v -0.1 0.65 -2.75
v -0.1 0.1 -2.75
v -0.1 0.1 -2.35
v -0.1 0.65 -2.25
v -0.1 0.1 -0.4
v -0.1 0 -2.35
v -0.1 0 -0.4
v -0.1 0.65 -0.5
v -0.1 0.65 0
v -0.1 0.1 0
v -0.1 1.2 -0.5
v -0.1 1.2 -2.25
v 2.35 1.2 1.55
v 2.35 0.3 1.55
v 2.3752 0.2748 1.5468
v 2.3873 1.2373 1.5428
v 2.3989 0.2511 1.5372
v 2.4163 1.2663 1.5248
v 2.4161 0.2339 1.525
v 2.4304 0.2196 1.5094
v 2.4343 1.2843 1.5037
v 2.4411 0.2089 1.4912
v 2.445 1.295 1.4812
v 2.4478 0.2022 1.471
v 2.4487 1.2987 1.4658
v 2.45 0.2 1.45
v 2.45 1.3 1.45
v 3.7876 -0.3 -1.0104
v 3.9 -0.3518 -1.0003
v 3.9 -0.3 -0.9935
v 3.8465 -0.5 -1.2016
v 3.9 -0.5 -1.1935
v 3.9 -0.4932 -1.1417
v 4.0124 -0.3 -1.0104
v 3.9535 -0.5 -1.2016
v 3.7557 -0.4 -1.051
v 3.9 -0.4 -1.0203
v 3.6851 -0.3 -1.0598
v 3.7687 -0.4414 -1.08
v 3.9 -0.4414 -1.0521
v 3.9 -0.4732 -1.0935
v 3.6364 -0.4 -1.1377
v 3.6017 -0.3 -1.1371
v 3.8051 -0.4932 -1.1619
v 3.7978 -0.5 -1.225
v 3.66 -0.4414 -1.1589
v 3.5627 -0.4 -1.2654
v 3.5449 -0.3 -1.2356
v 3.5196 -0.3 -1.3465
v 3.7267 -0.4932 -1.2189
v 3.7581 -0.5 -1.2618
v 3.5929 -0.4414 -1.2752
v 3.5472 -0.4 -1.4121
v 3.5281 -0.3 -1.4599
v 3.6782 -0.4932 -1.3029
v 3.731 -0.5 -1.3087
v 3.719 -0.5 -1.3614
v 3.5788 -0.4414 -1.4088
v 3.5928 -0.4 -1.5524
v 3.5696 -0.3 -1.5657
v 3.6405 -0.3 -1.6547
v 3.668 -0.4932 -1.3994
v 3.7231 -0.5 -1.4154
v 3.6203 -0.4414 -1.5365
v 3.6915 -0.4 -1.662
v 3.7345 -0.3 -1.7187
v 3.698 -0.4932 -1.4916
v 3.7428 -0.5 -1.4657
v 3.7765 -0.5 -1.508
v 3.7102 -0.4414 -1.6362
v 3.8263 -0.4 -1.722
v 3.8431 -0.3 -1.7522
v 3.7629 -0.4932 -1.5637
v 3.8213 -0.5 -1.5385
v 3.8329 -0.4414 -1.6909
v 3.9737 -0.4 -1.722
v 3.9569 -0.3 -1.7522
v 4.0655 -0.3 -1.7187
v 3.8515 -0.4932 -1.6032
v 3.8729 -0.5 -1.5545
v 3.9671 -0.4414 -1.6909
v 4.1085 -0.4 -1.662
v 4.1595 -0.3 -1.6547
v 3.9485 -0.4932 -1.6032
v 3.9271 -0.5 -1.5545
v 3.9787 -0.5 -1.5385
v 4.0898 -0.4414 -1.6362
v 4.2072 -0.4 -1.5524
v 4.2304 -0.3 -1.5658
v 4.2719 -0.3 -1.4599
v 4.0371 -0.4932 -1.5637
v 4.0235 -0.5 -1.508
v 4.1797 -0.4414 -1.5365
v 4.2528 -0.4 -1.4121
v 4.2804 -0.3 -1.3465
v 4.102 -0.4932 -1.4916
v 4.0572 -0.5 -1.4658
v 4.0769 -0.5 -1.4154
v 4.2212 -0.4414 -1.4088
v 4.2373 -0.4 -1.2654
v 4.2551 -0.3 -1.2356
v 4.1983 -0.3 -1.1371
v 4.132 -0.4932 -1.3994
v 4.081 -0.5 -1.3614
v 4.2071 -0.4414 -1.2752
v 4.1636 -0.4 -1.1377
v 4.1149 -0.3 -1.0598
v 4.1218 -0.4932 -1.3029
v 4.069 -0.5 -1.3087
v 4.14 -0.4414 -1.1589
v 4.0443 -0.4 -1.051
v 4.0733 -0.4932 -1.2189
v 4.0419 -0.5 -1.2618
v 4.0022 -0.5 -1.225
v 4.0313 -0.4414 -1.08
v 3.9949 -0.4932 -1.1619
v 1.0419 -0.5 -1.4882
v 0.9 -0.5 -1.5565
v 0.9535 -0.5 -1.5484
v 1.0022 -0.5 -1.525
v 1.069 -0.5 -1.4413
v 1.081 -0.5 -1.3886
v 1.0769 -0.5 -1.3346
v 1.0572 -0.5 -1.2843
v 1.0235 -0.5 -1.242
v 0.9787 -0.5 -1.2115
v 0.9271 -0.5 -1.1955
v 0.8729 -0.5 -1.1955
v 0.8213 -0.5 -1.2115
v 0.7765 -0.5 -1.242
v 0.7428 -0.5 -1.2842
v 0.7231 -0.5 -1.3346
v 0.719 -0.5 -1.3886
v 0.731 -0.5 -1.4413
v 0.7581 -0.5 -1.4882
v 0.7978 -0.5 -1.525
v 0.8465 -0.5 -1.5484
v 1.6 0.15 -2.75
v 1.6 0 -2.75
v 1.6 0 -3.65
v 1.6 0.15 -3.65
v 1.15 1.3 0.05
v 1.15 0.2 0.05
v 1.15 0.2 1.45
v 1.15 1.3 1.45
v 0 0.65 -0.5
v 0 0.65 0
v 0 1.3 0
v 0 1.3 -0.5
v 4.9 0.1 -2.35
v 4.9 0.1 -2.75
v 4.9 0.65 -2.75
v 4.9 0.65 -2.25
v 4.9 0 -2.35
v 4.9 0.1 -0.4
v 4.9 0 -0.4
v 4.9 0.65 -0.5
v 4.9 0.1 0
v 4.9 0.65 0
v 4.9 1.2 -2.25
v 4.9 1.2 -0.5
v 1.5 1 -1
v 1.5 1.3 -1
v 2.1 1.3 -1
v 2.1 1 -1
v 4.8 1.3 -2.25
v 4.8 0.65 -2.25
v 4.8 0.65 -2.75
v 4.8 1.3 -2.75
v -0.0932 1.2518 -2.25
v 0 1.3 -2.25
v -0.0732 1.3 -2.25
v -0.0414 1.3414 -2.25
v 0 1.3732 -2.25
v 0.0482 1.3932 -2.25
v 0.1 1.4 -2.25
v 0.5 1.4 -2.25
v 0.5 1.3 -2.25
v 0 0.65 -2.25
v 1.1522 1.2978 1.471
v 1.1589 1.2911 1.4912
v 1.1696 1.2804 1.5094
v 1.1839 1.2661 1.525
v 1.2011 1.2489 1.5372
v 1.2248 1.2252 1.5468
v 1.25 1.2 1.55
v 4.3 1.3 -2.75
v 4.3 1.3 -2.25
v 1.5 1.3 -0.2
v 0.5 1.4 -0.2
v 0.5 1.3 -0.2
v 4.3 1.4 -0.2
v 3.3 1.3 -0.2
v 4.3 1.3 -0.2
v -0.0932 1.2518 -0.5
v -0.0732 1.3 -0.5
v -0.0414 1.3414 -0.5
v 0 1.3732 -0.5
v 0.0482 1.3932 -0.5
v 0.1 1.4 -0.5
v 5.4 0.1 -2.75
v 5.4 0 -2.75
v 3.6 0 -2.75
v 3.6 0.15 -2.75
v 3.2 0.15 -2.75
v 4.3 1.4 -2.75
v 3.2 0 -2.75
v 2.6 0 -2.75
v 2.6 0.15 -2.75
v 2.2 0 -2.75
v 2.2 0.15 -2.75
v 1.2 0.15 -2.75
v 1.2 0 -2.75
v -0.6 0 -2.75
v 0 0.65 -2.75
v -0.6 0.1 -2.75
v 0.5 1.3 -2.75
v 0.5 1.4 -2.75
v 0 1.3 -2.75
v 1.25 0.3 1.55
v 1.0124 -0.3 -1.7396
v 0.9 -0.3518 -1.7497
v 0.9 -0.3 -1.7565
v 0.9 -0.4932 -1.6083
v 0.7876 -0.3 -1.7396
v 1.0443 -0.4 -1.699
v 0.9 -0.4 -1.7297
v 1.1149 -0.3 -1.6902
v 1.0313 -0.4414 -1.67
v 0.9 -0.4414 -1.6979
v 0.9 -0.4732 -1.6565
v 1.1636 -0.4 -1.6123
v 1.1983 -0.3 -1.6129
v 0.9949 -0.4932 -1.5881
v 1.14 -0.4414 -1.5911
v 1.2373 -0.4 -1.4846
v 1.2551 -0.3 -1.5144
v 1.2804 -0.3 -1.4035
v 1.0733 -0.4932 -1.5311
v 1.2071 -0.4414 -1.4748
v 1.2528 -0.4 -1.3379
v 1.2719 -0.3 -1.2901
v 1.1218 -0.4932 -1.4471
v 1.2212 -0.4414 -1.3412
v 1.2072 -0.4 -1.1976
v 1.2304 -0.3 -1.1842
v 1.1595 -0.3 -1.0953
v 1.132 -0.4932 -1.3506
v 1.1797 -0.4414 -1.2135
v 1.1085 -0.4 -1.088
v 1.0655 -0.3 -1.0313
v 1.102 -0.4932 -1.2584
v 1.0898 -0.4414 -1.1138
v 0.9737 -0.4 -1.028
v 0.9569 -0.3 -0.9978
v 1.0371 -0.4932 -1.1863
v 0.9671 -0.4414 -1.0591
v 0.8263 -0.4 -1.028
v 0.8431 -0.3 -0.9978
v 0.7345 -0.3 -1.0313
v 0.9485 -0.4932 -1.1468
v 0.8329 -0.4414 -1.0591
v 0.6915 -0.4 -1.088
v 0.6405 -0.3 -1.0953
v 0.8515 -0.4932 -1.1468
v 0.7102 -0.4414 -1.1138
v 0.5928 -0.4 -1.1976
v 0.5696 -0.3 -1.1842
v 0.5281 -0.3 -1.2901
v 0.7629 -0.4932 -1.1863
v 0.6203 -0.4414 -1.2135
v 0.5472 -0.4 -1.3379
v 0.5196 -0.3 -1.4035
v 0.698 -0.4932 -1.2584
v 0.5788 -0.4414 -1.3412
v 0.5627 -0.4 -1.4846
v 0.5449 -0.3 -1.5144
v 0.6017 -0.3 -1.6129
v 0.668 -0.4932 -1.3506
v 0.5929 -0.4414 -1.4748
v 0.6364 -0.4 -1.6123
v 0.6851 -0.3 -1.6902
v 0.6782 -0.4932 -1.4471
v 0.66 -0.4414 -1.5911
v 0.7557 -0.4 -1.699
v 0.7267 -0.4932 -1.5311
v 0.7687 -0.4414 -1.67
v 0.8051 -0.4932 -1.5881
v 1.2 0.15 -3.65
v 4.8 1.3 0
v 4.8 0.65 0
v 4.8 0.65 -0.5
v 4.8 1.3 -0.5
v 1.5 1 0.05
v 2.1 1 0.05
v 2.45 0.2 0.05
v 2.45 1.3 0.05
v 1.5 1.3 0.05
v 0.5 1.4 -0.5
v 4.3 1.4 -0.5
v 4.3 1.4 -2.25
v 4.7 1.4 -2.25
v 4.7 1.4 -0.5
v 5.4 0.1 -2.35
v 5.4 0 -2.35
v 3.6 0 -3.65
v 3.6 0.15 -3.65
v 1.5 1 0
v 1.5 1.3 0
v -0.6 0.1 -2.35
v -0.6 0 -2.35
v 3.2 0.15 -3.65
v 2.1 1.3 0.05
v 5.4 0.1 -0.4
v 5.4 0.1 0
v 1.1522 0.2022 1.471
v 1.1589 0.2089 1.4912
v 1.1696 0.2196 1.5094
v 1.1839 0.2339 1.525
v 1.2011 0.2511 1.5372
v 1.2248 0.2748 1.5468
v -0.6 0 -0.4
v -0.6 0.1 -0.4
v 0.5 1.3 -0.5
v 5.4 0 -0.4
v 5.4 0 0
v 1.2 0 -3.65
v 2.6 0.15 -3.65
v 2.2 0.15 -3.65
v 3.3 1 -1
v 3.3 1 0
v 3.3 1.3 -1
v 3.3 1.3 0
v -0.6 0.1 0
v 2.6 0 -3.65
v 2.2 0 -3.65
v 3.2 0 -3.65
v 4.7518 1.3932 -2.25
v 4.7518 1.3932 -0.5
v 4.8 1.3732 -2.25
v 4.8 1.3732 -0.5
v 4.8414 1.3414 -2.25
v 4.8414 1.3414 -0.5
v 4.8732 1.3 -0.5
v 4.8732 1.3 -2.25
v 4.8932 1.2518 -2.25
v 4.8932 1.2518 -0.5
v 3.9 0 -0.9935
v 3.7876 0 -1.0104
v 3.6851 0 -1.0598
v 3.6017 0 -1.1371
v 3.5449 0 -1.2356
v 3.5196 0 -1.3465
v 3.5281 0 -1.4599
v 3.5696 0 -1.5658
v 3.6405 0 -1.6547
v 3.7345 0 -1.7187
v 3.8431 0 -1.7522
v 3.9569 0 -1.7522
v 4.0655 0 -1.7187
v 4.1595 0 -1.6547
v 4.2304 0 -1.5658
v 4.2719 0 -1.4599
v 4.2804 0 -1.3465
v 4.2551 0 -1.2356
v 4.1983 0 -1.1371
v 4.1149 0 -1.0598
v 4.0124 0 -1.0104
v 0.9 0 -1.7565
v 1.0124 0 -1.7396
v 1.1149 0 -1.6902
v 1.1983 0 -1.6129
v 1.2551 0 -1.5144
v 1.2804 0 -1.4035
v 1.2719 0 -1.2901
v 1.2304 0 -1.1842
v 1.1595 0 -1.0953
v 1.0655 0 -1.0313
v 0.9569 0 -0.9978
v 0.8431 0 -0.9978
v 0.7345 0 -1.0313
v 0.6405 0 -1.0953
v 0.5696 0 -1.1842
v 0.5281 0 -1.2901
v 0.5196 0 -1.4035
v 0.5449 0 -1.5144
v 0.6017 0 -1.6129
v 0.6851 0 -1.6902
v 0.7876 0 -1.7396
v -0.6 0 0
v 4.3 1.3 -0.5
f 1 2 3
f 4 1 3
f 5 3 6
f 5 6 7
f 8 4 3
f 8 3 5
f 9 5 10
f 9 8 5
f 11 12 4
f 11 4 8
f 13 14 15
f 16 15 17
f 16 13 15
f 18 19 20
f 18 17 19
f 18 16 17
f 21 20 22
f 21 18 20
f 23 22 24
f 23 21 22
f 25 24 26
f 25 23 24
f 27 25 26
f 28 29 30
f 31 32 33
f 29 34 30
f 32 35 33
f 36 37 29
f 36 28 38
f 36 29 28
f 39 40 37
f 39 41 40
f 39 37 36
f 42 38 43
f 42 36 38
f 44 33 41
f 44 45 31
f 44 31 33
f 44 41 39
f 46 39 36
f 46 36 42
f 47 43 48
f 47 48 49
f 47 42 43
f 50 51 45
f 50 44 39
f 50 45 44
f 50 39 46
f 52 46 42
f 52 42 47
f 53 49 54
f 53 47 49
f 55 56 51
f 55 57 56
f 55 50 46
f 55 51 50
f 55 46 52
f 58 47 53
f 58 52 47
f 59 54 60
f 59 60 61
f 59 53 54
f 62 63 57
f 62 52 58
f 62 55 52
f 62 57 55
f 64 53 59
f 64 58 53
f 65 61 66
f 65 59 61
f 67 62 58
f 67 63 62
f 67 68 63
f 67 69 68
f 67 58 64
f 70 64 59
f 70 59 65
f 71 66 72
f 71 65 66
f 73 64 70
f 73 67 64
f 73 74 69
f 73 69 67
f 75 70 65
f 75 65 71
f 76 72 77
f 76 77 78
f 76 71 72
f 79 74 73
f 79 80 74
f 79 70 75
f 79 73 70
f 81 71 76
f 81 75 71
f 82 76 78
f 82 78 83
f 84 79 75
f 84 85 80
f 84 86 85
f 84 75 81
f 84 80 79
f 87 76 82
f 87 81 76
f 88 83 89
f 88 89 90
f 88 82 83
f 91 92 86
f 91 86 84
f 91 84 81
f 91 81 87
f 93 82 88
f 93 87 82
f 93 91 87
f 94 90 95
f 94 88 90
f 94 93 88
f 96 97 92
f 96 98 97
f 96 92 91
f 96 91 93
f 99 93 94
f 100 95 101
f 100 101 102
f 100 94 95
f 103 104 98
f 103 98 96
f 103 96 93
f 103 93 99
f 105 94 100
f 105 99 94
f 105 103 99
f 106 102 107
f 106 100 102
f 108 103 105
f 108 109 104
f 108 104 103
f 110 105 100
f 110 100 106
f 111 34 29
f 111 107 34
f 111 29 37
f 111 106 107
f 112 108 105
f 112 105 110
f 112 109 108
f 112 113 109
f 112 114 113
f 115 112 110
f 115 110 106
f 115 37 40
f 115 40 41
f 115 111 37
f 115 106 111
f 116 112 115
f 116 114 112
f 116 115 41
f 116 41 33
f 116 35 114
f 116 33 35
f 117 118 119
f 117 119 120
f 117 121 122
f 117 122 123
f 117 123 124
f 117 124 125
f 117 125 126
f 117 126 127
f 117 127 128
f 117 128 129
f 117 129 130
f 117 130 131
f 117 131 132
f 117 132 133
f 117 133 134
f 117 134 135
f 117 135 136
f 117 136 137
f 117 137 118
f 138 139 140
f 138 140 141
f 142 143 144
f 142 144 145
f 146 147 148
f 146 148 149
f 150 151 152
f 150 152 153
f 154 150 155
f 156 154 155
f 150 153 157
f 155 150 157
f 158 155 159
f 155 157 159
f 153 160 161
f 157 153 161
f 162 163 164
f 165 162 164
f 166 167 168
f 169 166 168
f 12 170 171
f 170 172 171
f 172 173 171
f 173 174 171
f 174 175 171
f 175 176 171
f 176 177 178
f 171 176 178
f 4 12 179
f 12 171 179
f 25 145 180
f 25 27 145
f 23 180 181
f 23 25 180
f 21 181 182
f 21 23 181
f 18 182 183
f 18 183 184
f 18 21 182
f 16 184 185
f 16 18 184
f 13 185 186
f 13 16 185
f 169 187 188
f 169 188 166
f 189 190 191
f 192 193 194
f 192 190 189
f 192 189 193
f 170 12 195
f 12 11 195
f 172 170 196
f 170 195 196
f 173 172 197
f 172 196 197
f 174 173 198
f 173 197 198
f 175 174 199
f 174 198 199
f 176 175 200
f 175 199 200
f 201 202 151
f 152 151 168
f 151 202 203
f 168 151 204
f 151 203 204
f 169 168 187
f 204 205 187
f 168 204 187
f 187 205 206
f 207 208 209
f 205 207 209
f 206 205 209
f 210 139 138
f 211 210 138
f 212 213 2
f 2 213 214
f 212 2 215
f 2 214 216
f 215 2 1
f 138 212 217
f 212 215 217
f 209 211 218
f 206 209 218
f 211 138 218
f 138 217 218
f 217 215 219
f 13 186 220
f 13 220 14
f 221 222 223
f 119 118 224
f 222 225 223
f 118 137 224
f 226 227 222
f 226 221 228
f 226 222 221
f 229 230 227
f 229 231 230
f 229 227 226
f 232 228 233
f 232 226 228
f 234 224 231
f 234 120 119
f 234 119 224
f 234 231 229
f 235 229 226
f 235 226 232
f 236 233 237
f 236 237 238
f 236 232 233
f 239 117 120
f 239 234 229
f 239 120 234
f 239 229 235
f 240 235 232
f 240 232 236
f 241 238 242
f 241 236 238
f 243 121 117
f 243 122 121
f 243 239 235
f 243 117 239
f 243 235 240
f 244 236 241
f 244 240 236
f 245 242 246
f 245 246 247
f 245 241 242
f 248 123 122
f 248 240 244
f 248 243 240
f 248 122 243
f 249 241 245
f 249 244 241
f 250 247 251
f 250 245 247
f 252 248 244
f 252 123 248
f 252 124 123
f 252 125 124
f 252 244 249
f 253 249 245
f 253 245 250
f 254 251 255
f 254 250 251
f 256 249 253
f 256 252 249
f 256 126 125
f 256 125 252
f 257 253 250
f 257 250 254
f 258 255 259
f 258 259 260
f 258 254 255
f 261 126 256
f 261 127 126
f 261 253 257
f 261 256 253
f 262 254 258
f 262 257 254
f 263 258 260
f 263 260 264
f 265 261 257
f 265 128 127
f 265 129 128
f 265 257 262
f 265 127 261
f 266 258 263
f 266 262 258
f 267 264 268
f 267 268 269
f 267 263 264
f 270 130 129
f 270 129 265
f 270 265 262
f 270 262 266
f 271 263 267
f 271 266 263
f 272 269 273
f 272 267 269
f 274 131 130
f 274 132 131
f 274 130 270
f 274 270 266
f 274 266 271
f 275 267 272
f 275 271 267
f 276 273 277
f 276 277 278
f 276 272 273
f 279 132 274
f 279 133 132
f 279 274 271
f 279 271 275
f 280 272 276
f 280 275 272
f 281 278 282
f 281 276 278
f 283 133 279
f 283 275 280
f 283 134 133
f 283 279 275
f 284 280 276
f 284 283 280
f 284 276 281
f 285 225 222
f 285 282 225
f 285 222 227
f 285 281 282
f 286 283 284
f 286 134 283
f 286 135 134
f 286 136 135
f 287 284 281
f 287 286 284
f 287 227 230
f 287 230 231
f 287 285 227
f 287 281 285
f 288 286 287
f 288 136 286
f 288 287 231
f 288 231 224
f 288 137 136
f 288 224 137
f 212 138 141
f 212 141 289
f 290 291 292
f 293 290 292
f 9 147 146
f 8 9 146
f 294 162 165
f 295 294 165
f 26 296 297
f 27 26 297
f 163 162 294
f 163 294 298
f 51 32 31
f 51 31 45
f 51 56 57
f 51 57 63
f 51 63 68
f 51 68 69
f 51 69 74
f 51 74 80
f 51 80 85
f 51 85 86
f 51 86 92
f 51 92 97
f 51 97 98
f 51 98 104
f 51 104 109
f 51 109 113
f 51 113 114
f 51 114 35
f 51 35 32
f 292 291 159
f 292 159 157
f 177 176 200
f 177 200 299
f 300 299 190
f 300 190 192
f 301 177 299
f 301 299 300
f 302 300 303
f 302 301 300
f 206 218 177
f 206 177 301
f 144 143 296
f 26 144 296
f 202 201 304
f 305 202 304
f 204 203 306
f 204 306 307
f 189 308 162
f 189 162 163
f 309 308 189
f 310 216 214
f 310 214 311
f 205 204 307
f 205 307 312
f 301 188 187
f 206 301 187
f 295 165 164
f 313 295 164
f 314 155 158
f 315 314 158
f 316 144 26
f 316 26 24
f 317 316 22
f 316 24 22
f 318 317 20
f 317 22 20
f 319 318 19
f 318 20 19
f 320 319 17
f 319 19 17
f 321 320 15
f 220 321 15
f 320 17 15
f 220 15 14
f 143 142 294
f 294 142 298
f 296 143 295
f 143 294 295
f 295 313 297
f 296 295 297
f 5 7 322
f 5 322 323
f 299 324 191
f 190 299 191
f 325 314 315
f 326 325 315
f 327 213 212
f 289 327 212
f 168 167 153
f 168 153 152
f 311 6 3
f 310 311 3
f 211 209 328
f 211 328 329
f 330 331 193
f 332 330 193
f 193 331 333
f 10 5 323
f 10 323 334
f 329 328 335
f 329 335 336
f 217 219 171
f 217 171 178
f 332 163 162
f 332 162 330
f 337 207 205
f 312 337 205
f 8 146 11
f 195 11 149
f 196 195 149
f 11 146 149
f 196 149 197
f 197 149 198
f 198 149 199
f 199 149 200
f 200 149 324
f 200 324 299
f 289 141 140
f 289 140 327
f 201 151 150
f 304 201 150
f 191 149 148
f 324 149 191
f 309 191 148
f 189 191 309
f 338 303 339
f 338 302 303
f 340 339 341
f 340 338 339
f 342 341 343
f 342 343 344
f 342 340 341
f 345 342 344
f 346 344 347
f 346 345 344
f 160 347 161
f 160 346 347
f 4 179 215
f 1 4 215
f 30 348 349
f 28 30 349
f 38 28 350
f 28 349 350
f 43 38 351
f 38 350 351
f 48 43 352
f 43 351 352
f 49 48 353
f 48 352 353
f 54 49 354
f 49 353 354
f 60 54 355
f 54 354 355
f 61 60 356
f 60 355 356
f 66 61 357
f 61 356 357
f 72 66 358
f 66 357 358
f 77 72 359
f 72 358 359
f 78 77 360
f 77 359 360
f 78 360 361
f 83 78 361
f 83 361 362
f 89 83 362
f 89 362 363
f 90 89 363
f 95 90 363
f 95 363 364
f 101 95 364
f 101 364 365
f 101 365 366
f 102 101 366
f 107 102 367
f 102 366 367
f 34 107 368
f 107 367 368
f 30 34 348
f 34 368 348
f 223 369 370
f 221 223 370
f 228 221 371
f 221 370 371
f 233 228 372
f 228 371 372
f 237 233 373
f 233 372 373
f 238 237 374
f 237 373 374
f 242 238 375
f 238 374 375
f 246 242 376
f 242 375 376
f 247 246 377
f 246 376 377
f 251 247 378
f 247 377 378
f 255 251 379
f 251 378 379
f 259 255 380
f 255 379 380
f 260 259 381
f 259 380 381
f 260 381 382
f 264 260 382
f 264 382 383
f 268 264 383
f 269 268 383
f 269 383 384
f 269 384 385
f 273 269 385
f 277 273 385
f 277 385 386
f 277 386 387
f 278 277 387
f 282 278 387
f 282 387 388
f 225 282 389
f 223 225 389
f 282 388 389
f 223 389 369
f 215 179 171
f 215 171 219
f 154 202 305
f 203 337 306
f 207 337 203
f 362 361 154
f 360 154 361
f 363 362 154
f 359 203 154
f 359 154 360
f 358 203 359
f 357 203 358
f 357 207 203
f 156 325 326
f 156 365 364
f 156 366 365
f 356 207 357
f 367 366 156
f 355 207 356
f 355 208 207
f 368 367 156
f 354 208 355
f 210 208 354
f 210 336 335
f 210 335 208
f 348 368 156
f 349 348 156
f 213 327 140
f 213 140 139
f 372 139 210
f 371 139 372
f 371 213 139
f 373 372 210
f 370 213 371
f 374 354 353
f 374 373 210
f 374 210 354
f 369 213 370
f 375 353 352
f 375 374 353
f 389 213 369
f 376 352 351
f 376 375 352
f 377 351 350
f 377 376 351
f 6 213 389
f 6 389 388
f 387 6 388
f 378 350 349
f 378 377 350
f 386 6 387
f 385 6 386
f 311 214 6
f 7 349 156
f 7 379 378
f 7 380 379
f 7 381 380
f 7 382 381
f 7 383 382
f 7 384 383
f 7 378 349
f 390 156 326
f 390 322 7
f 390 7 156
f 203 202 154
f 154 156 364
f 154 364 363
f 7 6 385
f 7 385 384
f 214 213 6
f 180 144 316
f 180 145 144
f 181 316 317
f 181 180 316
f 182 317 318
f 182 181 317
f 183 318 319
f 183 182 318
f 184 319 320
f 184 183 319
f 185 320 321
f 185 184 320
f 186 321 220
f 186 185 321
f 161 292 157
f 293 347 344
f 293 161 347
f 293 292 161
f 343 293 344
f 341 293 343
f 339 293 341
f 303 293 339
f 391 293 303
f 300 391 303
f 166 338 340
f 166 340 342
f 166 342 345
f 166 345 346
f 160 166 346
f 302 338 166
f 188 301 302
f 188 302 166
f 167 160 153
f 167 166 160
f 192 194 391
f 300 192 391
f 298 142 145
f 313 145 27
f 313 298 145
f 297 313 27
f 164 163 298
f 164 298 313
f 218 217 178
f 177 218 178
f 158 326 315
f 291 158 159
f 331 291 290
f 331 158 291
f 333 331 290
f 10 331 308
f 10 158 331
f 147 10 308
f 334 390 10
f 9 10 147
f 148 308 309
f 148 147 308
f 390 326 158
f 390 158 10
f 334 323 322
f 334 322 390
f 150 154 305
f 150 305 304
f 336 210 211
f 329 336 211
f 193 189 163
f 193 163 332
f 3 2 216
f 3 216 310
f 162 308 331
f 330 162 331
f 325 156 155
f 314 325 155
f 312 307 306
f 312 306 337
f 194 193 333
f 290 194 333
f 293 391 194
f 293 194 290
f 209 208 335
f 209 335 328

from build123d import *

# Parameters (mm, degrees)
SKETCH_1_W          = 4.8
SKETCH_1_H          = 2.75
EXTRUDE_1_DEPTH     = 1.3
SKETCH_2_W          = 0.1
SKETCH_2_H          = 1.75
EXTRUDE_3_DEPTH     = 0.1
EXTRUDE_4_DEPTH     = 0.1
SKETCH_4_W          = 0.4
SKETCH_4_H          = 0.1
EXTRUDE_5_DEPTH     = 0.5
SKETCH_5_W          = 3.8
SKETCH_5_H          = 0.2
CUT_EXTRUDE_1_DEPTH = 0.1
SKETCH_6_W          = 1.8
SKETCH_6_H          = 0.3
CUT_EXTRUDE_2_DEPTH = 1
SKETCH_7_W          = 0.6
SKETCH_7_H          = 0.3
EXTRUDE_6_DEPTH     = 1.05
SKETCH_8_W          = 1.3
SKETCH_8_H          = 1.1
EXTRUDE_7_DEPTH     = 1.5
SKETCH_9_W          = 0.4
SKETCH_9_H          = 0.15
EXTRUDE_8_DEPTH     = 0.9
FILLET_1_R          = 0.2
FILLET_2_R          = 0.1
SKETCH_10_R         = 0.3815
EXTRUDE_9_DEPTH     = 0.5
FILLET_3_R          = 0.2


with BuildPart() as part:
    # 草图1 → 凸台-拉伸1 (new body)
    with BuildSketch(Plane(origin=(0, 0, 0), x_dir=(1, 0, 0), z_dir=(0, 1, 0))):
        with Locations((2.4, 1.375)):
            Rectangle(SKETCH_1_W, SKETCH_1_H)
    extrude(amount=EXTRUDE_1_DEPTH)



with BuildPart() as body_2:
    # 草图2 → 凸台-拉伸3 (new body)
    with BuildSketch(Plane(origin=(0, 1.3, 0), x_dir=(1, 0, 0), z_dir=(0, 1, 0))):
        Polygon((0.5, 2.25), (0, 2.25), (0, 1.375), (0, 0.5), (0.5, 0.5), (0.5, 0), (4.3, 0), (4.3, 0.5), (4.8, 0.5), (4.8, 2.25), (4.3, 2.25), (4.3, 2.75), (0.5, 2.75), align=None)
        Polygon((0, 1.375), (0, 2.25), (-0.1, 2.25), (-0.1, 0.5), (0, 0.5), align=None)
        with Locations((4.85, 1.375)):
            Rectangle(SKETCH_2_W, SKETCH_2_H)
    extrude(amount=EXTRUDE_3_DEPTH)


with BuildPart() as part_1:
    add(part.part)

    add(body_2.part)  # 凸台-拉伸4 merges body 2
    # 草图3 → 凸台-拉伸4 (add)
    with BuildSketch(Plane.ZY):
        Polygon((-2.75, 0), (0, 0), (0, 0.65), (-0.5, 0.65), (-0.5, 1.3), (-2.25, 1.3), (-2.25, 0.65), (-2.75, 0.65), align=None)
    extrude(amount=EXTRUDE_4_DEPTH)


with BuildPart() as body_2_2:
    # 镜向16: mirrored copy
    add(part_1.part.mirror(Plane(origin=(2.4, 0, 0), x_dir=(0, 0, 1), z_dir=(1, 0, 0))))


with BuildPart() as part_2:
    add(part_1.part)

    add(body_2_2.part)  # 凸台-拉伸5 merges body 2 2
    # 草图4 → 凸台-拉伸5 (add)
    with BuildSketch(Plane.ZY.offset(0.1)):
        with Locations((-2.55, 0.05)):
            Rectangle(SKETCH_4_W, SKETCH_4_H)
        with Locations((-0.2, 0.05)):
            Rectangle(SKETCH_4_W, SKETCH_4_H)
    extrude(amount=EXTRUDE_5_DEPTH)

    # 镜向17: part across plane


with BuildPart() as part_3:
    add(part_2.part)
    add(part_2.part.mirror(Plane(origin=(2.4, 0, 0), x_dir=(0, 0, 1), z_dir=(1, 0, 0))))

    # 草图5 → 切除-拉伸1 (cut)
    with BuildSketch(Plane(origin=(0, 1.4, 0), x_dir=(1, 0, 0), z_dir=(0, 1, 0))):
        with Locations((2.4, 0.1)):
            Rectangle(SKETCH_5_W, SKETCH_5_H)
    extrude(amount=-CUT_EXTRUDE_1_DEPTH, mode=Mode.SUBTRACT)

    # 草图6 → 切除-拉伸2 (cut)
    with BuildSketch(Plane.XY):
        with Locations((2.4, 1.15)):
            Rectangle(SKETCH_6_W, SKETCH_6_H)
    extrude(amount=-CUT_EXTRUDE_2_DEPTH, mode=Mode.SUBTRACT)

    # 草图9 → 凸台-拉伸8 (add)
    with BuildSketch(Plane(origin=(0, 0, -2.75), x_dir=(-1, 0, 0), z_dir=(0, 0, -1))):
        with Locations((-1.4, 0.075)):
            Rectangle(SKETCH_9_W, SKETCH_9_H)
        with Locations((-2.4, 0.075)):
            Rectangle(SKETCH_9_W, SKETCH_9_H)
        with Locations((-3.4, 0.075)):
            Rectangle(SKETCH_9_W, SKETCH_9_H)
    extrude(amount=EXTRUDE_8_DEPTH)

    # 圆角1
    fillet_1_edges = [part_3.edges().sort_by_distance(p)[0] for p in [
        (4.9, 1.4, -1.375),
        (-0.1, 1.4, -1.375),
    ]]
    fillet(fillet_1_edges, radius=FILLET_1_R)

    # 草图10 → 凸台-拉伸9 (add)
    with BuildSketch(Plane.XZ):
        with Locations(Location((0.9, -1.375, 0), (0, 0, 270))):
            Circle(SKETCH_10_R)
        with Locations(Location((3.9, -1.375, 0), (0, 0, 90))):
            Circle(SKETCH_10_R)
    extrude(amount=EXTRUDE_9_DEPTH)

    # 圆角3
    fillet_3_edges = [part_3.edges().sort_by_distance(p)[0] for p in [
        (0.9, -0.5, -0.9935),
        (3.9, -0.5, -1.7565),
    ]]
    fillet(fillet_3_edges, radius=FILLET_3_R)


with BuildPart() as body_2_3:
    # 草图7 → 凸台-拉伸6 (new body)
    with BuildSketch(Plane.XY.offset(-1)):
        with Locations((1.8, 1.15)):
            Rectangle(SKETCH_7_W, SKETCH_7_H)
    extrude(amount=EXTRUDE_6_DEPTH)

    # 草图8 → 凸台-拉伸7 (add)
    with BuildSketch(Plane.XY.offset(0.05)):
        with Locations((1.8, 0.75)):
            Rectangle(SKETCH_8_W, SKETCH_8_H)
    extrude(amount=EXTRUDE_7_DEPTH)

    # 圆角2
    fillet_2_edges = [body_2_3.edges().sort_by_distance(p)[0] for p in [
        (1.15, 0.75, 1.55),
        (1.8, 0.2, 1.55),
        (2.45, 0.75, 1.55),
        (1.8, 1.3, 1.55),
    ]]
    fillet(fillet_2_edges, radius=FILLET_2_R)


solid = Compound([part_3.part, body_2_3.part])
